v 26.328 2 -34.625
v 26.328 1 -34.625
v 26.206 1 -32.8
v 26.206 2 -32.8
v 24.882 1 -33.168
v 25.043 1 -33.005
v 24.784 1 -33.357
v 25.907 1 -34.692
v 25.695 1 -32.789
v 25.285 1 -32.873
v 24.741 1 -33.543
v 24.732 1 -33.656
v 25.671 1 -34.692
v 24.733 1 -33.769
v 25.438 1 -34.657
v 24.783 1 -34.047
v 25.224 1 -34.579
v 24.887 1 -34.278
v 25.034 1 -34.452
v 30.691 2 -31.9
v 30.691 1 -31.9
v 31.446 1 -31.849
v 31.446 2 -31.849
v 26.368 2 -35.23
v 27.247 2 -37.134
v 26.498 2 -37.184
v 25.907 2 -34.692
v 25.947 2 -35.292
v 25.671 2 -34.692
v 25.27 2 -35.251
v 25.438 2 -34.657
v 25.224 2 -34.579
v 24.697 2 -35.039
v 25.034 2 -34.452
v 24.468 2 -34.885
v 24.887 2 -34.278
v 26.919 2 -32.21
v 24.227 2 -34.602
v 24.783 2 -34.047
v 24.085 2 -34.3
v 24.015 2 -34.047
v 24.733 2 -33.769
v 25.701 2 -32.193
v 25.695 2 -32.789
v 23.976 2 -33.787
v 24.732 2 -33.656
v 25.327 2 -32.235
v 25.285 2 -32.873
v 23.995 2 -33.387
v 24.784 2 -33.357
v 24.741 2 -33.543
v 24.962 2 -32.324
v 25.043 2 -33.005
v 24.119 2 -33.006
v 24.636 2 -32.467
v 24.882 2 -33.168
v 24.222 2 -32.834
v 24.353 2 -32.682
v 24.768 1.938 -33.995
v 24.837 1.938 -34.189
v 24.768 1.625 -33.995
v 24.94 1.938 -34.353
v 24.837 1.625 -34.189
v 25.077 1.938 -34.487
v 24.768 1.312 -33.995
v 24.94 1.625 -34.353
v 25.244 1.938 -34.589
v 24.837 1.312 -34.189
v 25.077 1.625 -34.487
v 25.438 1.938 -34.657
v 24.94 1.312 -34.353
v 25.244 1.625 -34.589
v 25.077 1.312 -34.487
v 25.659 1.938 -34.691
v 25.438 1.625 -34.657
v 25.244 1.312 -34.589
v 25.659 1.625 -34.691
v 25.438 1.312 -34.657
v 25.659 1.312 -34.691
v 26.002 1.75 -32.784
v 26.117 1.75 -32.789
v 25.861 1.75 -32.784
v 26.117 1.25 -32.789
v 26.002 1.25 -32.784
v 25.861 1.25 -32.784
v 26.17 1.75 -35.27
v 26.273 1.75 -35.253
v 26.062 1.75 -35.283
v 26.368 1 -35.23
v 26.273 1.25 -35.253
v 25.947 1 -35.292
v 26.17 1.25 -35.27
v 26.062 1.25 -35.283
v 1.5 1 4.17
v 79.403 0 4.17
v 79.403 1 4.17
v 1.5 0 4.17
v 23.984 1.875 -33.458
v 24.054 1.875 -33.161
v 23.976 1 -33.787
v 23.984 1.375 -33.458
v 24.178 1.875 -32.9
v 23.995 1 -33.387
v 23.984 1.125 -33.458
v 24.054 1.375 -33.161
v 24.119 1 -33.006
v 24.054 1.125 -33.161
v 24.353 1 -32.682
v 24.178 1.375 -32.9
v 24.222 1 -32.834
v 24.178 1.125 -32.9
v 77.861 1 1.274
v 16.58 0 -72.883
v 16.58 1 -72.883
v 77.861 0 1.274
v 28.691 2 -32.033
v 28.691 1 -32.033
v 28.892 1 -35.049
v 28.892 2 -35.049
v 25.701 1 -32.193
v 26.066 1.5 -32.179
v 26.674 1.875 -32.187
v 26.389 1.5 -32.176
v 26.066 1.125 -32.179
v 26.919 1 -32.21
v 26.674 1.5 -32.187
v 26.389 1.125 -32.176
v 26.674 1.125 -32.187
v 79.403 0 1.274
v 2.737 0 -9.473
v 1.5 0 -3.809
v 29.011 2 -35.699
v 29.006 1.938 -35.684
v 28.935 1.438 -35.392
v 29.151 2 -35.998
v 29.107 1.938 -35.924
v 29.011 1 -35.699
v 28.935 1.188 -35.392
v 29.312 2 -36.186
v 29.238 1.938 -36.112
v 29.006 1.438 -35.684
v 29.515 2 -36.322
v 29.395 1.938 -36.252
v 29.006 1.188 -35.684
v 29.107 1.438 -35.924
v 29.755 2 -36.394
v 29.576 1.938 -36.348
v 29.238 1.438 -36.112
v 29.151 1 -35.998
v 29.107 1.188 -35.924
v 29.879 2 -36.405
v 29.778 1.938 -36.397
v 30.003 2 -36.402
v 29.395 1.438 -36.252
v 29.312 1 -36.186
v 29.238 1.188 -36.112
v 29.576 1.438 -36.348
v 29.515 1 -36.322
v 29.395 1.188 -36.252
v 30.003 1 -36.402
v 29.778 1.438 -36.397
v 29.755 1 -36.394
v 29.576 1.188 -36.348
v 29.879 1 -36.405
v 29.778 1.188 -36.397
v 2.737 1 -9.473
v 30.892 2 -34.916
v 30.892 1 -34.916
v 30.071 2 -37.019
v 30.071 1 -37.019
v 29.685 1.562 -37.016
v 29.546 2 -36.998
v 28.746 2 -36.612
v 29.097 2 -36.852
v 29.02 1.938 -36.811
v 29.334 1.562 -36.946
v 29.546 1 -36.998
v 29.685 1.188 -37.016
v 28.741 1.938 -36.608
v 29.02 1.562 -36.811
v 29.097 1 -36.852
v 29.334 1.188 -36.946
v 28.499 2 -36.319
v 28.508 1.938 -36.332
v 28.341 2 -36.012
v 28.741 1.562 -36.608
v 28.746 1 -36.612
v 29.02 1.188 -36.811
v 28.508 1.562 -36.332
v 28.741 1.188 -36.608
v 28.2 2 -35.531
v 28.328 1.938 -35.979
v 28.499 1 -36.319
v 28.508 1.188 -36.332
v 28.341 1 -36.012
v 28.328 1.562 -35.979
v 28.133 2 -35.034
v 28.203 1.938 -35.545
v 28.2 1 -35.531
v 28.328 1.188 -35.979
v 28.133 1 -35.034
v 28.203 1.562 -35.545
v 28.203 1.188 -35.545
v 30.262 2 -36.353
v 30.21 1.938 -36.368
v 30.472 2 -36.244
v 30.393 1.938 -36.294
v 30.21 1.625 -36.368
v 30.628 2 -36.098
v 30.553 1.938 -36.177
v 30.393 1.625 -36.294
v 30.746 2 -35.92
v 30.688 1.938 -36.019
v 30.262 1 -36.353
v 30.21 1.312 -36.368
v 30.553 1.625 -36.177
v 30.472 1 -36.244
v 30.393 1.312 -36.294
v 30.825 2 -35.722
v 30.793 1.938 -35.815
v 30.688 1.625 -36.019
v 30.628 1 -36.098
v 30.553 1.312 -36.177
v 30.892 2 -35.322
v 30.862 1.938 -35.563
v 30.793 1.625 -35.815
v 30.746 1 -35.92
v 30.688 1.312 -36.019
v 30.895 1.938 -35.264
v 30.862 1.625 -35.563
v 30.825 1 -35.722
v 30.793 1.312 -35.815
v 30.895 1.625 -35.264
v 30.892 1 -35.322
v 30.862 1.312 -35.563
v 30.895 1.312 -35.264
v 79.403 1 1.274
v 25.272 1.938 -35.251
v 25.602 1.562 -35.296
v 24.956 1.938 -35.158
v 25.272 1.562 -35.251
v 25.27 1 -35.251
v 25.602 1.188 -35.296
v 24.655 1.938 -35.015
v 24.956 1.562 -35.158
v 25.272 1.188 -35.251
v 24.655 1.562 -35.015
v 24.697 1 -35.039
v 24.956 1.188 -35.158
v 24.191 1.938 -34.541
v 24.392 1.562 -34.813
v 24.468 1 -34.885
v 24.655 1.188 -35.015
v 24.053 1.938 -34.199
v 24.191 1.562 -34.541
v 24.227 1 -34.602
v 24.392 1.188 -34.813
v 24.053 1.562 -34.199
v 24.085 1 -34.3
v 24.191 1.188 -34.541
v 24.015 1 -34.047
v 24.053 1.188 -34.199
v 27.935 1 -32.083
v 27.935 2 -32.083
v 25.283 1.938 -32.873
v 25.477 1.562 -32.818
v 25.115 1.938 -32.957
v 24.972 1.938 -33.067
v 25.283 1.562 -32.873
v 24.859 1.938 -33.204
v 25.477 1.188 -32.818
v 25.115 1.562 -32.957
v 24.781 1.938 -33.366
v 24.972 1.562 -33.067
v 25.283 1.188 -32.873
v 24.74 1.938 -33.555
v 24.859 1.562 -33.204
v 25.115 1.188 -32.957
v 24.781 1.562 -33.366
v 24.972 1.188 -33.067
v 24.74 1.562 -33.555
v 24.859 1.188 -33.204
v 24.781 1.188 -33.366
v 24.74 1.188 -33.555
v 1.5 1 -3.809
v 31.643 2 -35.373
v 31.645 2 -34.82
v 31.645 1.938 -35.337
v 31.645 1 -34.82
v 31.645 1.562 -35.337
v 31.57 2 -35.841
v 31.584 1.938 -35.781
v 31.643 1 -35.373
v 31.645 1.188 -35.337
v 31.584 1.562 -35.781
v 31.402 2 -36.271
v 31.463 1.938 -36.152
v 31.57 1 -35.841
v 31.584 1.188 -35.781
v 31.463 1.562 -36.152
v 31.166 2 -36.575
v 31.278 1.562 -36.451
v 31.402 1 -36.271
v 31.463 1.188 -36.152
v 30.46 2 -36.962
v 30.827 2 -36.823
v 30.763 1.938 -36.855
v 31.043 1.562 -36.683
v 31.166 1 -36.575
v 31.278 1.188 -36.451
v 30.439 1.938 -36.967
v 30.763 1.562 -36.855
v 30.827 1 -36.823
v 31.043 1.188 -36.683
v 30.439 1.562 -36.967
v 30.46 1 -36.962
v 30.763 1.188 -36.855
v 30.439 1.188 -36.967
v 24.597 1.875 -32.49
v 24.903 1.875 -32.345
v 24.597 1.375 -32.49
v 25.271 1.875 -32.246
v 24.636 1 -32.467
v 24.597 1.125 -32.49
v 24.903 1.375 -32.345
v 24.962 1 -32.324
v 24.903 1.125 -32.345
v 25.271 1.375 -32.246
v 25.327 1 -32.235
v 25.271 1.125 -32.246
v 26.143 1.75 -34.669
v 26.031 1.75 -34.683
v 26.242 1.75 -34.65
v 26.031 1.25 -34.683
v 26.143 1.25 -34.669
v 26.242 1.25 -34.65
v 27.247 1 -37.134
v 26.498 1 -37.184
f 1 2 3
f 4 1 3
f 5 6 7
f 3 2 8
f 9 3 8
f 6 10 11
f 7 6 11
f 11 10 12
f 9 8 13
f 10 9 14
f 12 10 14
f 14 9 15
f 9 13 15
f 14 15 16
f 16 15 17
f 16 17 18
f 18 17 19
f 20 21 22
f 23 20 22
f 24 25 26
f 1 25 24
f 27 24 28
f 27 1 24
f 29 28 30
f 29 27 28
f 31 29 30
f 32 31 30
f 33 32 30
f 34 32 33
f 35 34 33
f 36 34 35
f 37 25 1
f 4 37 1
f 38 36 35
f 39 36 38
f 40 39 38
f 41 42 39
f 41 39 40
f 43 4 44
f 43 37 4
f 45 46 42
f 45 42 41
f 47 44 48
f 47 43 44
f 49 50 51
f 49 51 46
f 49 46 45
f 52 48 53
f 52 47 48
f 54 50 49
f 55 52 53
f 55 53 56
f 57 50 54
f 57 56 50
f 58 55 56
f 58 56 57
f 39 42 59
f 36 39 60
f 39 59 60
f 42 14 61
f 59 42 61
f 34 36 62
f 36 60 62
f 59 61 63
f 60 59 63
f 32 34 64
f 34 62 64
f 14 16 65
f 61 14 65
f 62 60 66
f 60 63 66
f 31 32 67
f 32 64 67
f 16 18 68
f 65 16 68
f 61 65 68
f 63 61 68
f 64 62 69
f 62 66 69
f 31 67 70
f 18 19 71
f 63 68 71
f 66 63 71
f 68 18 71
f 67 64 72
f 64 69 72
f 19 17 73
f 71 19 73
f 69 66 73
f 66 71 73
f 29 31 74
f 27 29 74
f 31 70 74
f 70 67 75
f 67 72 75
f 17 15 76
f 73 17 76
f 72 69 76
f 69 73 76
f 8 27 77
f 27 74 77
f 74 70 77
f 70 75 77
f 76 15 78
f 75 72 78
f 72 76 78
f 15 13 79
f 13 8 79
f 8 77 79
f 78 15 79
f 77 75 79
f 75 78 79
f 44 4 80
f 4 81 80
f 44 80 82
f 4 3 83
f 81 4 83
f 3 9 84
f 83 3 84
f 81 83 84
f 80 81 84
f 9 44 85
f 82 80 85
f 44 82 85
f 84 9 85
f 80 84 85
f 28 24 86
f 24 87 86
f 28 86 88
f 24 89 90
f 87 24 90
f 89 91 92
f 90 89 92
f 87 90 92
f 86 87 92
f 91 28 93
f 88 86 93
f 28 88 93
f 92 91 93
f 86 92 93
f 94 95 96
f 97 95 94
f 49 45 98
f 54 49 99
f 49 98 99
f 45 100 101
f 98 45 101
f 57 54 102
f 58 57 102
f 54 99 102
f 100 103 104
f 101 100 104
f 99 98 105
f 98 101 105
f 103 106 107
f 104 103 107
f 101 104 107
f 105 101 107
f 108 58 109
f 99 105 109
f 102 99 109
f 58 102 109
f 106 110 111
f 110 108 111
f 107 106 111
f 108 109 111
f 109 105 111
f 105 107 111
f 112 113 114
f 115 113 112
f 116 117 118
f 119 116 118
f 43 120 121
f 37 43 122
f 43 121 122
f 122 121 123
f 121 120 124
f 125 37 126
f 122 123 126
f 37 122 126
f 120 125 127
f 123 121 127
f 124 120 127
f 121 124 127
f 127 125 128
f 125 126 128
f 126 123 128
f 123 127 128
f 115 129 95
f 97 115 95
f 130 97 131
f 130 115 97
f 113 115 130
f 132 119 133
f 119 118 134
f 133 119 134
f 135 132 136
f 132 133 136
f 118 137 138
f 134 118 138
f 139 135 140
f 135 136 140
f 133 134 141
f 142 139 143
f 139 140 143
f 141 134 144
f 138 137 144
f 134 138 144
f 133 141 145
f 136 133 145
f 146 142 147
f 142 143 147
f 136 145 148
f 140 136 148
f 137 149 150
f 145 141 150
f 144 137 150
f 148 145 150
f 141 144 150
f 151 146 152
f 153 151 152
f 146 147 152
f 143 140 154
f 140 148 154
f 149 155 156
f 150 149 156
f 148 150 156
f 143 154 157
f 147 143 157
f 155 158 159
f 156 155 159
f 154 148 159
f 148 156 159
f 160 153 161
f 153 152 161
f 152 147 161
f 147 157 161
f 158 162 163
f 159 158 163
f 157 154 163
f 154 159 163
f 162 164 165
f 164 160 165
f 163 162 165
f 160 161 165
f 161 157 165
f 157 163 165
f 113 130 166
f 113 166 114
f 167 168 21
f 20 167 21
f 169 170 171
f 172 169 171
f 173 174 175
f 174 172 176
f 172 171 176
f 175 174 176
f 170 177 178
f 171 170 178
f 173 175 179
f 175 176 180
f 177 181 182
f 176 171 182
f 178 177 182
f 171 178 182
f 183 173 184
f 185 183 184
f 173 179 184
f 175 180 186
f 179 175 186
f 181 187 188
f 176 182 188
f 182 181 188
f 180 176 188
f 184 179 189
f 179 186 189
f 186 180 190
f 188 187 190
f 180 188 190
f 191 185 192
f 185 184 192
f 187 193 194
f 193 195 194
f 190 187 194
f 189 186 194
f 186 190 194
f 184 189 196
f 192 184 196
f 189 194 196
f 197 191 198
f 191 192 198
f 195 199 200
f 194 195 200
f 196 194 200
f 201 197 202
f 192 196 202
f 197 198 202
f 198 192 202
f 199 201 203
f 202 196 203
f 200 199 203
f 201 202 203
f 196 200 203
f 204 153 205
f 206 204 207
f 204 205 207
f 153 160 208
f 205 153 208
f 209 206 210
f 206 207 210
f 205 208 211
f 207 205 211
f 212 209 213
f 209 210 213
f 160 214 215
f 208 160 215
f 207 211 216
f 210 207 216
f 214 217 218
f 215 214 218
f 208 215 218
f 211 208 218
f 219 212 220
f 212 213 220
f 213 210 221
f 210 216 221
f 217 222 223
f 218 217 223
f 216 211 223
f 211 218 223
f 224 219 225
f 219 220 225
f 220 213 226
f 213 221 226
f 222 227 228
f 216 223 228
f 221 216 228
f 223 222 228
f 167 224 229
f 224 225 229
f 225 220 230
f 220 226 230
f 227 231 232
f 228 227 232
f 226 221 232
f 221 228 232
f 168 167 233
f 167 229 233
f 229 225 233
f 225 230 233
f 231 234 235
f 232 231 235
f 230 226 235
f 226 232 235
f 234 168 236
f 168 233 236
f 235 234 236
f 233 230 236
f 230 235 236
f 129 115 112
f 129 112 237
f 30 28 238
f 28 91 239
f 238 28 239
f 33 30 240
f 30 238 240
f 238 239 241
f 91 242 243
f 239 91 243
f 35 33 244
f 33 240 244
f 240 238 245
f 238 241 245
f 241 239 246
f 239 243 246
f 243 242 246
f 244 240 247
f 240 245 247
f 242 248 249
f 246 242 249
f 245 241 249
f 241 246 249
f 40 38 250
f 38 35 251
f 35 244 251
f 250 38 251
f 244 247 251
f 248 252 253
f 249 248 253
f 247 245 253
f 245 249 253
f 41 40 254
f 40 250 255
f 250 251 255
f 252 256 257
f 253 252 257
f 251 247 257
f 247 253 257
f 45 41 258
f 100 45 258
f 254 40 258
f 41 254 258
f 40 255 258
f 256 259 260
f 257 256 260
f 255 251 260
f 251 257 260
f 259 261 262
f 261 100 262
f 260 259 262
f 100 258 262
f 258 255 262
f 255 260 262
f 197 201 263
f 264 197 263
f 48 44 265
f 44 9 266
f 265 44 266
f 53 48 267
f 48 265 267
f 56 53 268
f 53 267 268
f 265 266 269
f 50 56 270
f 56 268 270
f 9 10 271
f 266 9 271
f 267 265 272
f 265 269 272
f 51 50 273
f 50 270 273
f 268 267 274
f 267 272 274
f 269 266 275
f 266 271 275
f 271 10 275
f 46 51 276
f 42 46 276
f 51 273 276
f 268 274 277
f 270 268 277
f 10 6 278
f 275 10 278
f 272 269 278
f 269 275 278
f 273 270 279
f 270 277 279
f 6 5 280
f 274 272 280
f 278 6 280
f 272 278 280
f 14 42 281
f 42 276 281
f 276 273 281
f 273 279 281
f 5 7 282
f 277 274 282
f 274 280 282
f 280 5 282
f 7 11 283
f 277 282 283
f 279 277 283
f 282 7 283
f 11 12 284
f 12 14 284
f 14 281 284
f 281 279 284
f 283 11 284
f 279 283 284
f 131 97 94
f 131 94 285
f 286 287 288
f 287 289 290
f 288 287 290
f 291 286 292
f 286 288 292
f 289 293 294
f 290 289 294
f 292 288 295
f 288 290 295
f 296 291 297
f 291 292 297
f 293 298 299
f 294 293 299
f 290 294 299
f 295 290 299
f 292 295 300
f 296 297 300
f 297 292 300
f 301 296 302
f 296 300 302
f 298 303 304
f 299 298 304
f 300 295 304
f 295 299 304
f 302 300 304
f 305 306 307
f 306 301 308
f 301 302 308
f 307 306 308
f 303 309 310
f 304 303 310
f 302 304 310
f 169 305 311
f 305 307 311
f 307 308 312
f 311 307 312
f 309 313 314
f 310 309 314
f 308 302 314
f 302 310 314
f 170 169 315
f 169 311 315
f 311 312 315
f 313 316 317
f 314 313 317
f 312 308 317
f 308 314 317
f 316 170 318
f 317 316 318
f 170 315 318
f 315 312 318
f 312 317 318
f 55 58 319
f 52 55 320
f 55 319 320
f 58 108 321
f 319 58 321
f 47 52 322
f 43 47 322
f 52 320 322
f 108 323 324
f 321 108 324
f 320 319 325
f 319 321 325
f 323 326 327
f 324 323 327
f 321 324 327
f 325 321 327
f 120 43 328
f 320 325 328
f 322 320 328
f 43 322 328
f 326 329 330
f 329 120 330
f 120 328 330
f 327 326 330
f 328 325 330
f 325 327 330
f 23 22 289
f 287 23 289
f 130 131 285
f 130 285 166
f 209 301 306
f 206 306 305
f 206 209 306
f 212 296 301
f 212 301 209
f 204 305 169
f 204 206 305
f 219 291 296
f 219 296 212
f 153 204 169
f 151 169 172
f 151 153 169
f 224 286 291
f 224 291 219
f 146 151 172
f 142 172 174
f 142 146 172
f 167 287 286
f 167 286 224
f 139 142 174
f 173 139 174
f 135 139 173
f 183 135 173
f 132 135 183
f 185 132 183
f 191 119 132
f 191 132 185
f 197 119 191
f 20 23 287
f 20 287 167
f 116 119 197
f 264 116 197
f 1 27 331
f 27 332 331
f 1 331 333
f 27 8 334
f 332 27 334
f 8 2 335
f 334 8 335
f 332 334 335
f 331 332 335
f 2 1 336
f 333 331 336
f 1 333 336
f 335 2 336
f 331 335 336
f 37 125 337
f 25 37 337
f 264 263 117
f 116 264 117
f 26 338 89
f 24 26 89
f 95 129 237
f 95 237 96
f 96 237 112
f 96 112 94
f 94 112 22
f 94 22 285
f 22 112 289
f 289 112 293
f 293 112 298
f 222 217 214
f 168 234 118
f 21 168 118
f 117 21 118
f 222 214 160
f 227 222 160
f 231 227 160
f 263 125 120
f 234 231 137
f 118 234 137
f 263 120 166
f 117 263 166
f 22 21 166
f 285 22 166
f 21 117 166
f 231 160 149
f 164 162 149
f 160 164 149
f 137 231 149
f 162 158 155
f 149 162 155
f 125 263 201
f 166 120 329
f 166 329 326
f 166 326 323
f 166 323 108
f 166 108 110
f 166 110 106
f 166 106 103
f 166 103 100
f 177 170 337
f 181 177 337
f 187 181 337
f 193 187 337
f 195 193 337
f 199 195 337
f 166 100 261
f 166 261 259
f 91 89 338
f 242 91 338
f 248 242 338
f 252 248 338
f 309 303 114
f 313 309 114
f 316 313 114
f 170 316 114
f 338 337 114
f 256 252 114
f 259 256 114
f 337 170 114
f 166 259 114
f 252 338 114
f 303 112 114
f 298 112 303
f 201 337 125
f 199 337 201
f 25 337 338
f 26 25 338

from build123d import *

# Parameters (mm, degrees)
EXTRUDE_1_DEPTH = 1
EXTRUDE_2_DEPTH = 1


with BuildPart() as part:
    # 草图1 → 凸台-拉伸1 (new body)
    with BuildSketch(Plane(origin=(0, 0, 0), x_dir=(1, 0, 0), z_dir=(0, 1, 0))):
        Polygon((2.736696129, 9.473412041), (16.58017542, 72.883143872), (77.860885248, -1.274015551), (79.4026, -1.274015551), (79.4026, -4.17), (1.5, -4.17), (1.5, 3.808754461), align=None)
    extrude(amount=EXTRUDE_1_DEPTH)

    # 草图2 → 凸台-拉伸2 (add)
    # profile 1 of 2: a face of its own
    with BuildSketch(Plane.XZ.offset(-1)):
        with BuildLine():
            Line((27.247178656, -37.134108742), (26.498069264, -37.184070121))
            Line((26.498069264, -37.184070121), (26.367735231, -35.229871707))
            add(Edge.make_bspline(
                [(26.367735231, -35.229871707), (26.336136972, -35.237959723), (26.270940383, -35.254647701), (26.168685096, -35.271305323), (26.06001111, -35.283910157), (25.985459776, -35.288939032), (25.947055355, -35.291529611)],
                knots=[0, 0, 0, 0, 0.918524269, 1.895188248, 2.915725933, 4, 4, 4, 4], degree=3))
            add(Edge.make_bspline(
                [(25.947055355, -35.291529611), (25.888971534, -35.295059263), (25.773910138, -35.302051343), (25.602623819, -35.297682043), (25.435001026, -35.282463383), (25.271332319, -35.25320731), (25.111285307, -35.21277006), (24.954612218, -35.160015392), (24.802048503, -35.094230317), (24.653616239, -35.017919209), (24.513272279, -34.927178562), (24.389160738, -34.815143767), (24.279568532, -34.686737032), (24.186443183, -34.540279182), (24.109248199, -34.376664865), (24.048793797, -34.195673673), (24.00163799, -33.997727925), (23.98455536, -33.858833633), (23.975706741, -33.786887875)],
                knots=[0, 0, 0, 0, 0.996278886, 1.973582945, 2.931399707, 3.876509745, 4.818088033, 5.756508938, 6.704738743, 7.661035354, 8.613001496, 9.557911395, 10.514025425, 11.496214958, 12.521468463, 13.604750262, 14.759286266, 16, 16, 16, 16], degree=3))
            add(Edge.make_bspline(
                [(23.975706741, -33.786887875), (23.973452918, -33.730795501), (23.969040147, -33.620971923), (23.981295878, -33.459643046), (24.008316205, -33.30606268), (24.051249008, -33.160965902), (24.106879389, -33.024846473), (24.176026658, -32.899197677), (24.256208333, -32.783062463), (24.320948784, -32.715703234), (24.35321277, -32.682134156)],
                knots=[0, 0, 0, 0, 1.117887841, 2.188718949, 3.216803733, 4.219776148, 5.198259829, 6.140927987, 7.073514742, 8, 8, 8, 8], degree=3))
            add(Edge.make_bspline(
                [(24.35321277, -32.682134156), (24.390372306, -32.647075002), (24.465903781, -32.575812818), (24.597971222, -32.486883084), (24.743773905, -32.407877723), (24.905322916, -32.340638498), (25.082570482, -32.286184948), (25.274941514, -32.242813813), (25.482676378, -32.20986596), (25.626939116, -32.198747031), (25.701450626, -32.193004119)],
                knots=[0, 0, 0, 0, 0.835515405, 1.698291186, 2.597844701, 3.548800166, 4.558778601, 5.631012435, 6.776421119, 8, 8, 8, 8], degree=3))
            add(Edge.make_bspline(
                [(25.701450626, -32.193004119), (25.763647746, -32.18990621), (25.884969005, -32.183863452), (26.061872954, -32.178079125), (26.228994693, -32.176297304), (26.386085383, -32.175276922), (26.533358419, -32.180136733), (26.671037915, -32.185786151), (26.798547568, -32.19637649), (26.880137368, -32.205823077), (26.919139372, -32.210338786)],
                knots=[0, 0, 0, 0, 1.225714187, 2.39086934, 3.483452773, 4.515316552, 5.482438301, 6.383408239, 7.227227922, 8, 8, 8, 8], degree=3))
            Line((26.919139372, -32.210338786), (27.247178656, -37.134108742))
        make_face()
        with BuildLine():
            add(Edge.make_bspline(
                [(26.205686584, -32.800151678), (26.176079833, -32.796164938), (26.108374661, -32.787048001), (25.99329716, -32.783062649), (25.852753393, -32.782701532), (25.750681695, -32.786552967), (25.695306953, -32.788642403)],
                knots=[0, 0, 0, 0, 0.700870625, 1.60276173, 2.699478359, 4, 4, 4, 4], degree=3))
            add(Edge.make_bspline(
                [(25.695306953, -32.788642403), (25.657932433, -32.791833077), (25.58475194, -32.798080519), (25.478477782, -32.816141959), (25.378387391, -32.84124998), (25.283896528, -32.871209194), (25.196224059, -32.909838569), (25.115210741, -32.955481345), (25.03925353, -33.006155967), (24.970876759, -33.065156289), (24.909669441, -33.130586372), (24.856775337, -33.202660022), (24.814150815, -33.281632292), (24.778453834, -33.366335047), (24.754586229, -33.458484944), (24.738023638, -33.556671393), (24.729630946, -33.661109096), (24.731926616, -33.732692134), (24.733106875, -33.769494709)],
                knots=[0, 0, 0, 0, 1.15558629, 2.262674533, 3.317300313, 4.333814689, 5.313668358, 6.26345259, 7.196628822, 8.12266155, 9.039750842, 9.952722527, 10.868938376, 11.799486507, 12.778234057, 13.794331363, 14.866012282, 16, 16, 16, 16], degree=3))
            add(Edge.make_bspline(
                [(24.733106875, -33.769494709), (24.737096219, -33.808354477), (24.744855943, -33.883941104), (24.765532333, -33.993323197), (24.796982251, -34.094527148), (24.834175778, -34.189173984), (24.883030807, -34.274790461), (24.938222836, -34.354330579), (25.003166703, -34.425471317), (25.076160949, -34.48869148), (25.15623493, -34.544138738), (25.243910401, -34.590592199), (25.33838039, -34.628357489), (25.438808525, -34.659340274), (25.546631026, -34.679604309), (25.6607371, -34.69332827), (25.781865267, -34.696662397), (25.864468434, -34.693317664), (25.906870167, -34.69160075)],
                knots=[0, 0, 0, 0, 1.106707454, 2.152670698, 3.147355285, 4.106207412, 5.027575719, 5.933648193, 6.84458558, 7.748722376, 8.664759674, 9.598405993, 10.553638462, 11.544030495, 12.57124846, 13.657767573, 14.797688756, 16, 16, 16, 16], degree=3))
            add(Edge.make_bspline(
                [(25.906870167, -34.69160075), (25.948454683, -34.689062607), (26.027460929, -34.684240401), (26.139157586, -34.670071787), (26.238651685, -34.652463648), (26.299233543, -34.633690353), (26.327848462, -34.624823072)],
                knots=[0, 0, 0, 0, 1.169113496, 2.221193815, 3.159807954, 4, 4, 4, 4], degree=3))
            Line((26.327848462, -34.624823072), (26.205686584, -32.800151678))
        make_face(mode=Mode.SUBTRACT)
    # profile 2 of 2: a face of its own
    with BuildSketch(Plane.XZ.offset(-1)):
        with BuildLine():
            Line((27.935432574, -32.083430945), (28.691055961, -32.033035119))
            Line((28.691055961, -32.033035119), (28.892204819, -35.049014672))
            add(Edge.make_bspline(
                [(28.892204819, -35.049014672), (28.897507047, -35.108369157), (28.90777105, -35.223266999), (28.932979911, -35.388569892), (28.964110993, -35.541441954), (29.003735435, -35.681075959), (29.049877232, -35.80835476), (29.1038274, -35.922731741), (29.166322232, -36.023827925), (29.235308242, -36.112819124), (29.311927252, -36.188595136), (29.393405004, -36.254014097), (29.481306787, -36.307626326), (29.575139181, -36.34943819), (29.674153705, -36.380669278), (29.77898, -36.398543183), (29.88926244, -36.40743298), (29.964575532, -36.403749393), (30.003206868, -36.401859922)],
                knots=[0, 0, 0, 0, 1.439721744, 2.786999531, 4.038482243, 5.207354554, 6.291223817, 7.306895795, 8.257373748, 9.158006139, 10.021101694, 10.855396504, 11.677909811, 12.501584238, 13.332400486, 14.17961271, 15.066244781, 16, 16, 16, 16], degree=3))
            add(Edge.make_bspline(
                [(30.003206868, -36.401859922), (30.038729559, -36.398923305), (30.108621995, -36.393145384), (30.209684602, -36.370152125), (30.305513155, -36.33941236), (30.39396647, -36.294571366), (30.477851847, -36.242257996), (30.554413819, -36.177580795), (30.625625293, -36.103498895), (30.690312721, -36.018648553), (30.748019791, -35.922099382), (30.795846408, -35.813332953), (30.835215343, -35.692799841), (30.864869703, -35.56043382), (30.885460677, -35.416124074), (30.896184878, -35.260061022), (30.900103493, -35.091966457), (30.894877985, -34.976148439), (30.89216671, -34.916055829)],
                knots=[0, 0, 0, 0, 0.874153846, 1.719935635, 2.538919661, 3.33858121, 4.148201754, 4.961360028, 5.792268906, 6.667174948, 7.575383943, 8.547579609, 9.578266644, 10.684296341, 11.873995655, 13.154059738, 14.523373295, 16, 16, 16, 16], degree=3))
            Line((30.89216671, -34.916055829), (30.690852339, -31.899659959))
            Line((30.690852339, -31.899659959), (31.446475726, -31.849264133))
            Line((31.446475726, -31.849264133), (31.644583456, -34.819645723))
            add(Edge.make_bspline(
                [(31.644583456, -34.819645723), (31.648578386, -34.909049834), (31.656279514, -35.081396411), (31.647945267, -35.331247935), (31.626567199, -35.562863946), (31.588387672, -35.776491181), (31.535946157, -35.972611101), (31.467518593, -36.150749447), (31.382473647, -36.310338583), (31.282123362, -36.451459106), (31.168931277, -36.575879794), (31.045026327, -36.685519975), (30.909366494, -36.779545606), (30.762799952, -36.858191677), (30.605635955, -36.922509938), (30.437166438, -36.970123465), (30.258184476, -37.004084934), (30.134610832, -37.01396111), (30.071432155, -37.019010437)],
                knots=[0, 0, 0, 0, 1.392410449, 2.68418501, 3.887439475, 5.009764914, 6.057622654, 7.042685123, 7.97321012, 8.864539029, 9.730657168, 10.585789343, 11.434193697, 12.293614102, 13.169840523, 14.071727903, 15.014145116, 16, 16, 16, 16], degree=3))
            add(Edge.make_bspline(
                [(30.071432155, -37.019010437), (30.005641486, -37.022210067), (29.876827974, -37.028474717), (29.687187359, -37.019546443), (29.506284369, -36.993457544), (29.334867231, -36.949141616), (29.172110457, -36.889501605), (29.017921074, -36.813602283), (28.873390267, -36.719534025), (28.737918252, -36.609392285), (28.612277586, -36.481652914), (28.503727367, -36.331489281), (28.405978482, -36.163774568), (28.323255189, -35.975917378), (28.255263986, -35.767835389), (28.199330237, -35.541157099), (28.158249949, -35.294314561), (28.141696756, -35.123047155), (28.133118143, -35.034288632)],
                knots=[0, 0, 0, 0, 1.000276318, 1.958470843, 2.879248422, 3.77219387, 4.643297829, 5.508534547, 6.377296365, 7.25736848, 8.156904209, 9.090557831, 10.064428775, 11.101560789, 12.202301066, 13.386404782, 14.645516639, 16, 16, 16, 16], degree=3))
            Line((28.133118143, -35.034288632), (27.935432574, -32.083430945))
        make_face()
    extrude(amount=-EXTRUDE_2_DEPTH)


solid = part.part
